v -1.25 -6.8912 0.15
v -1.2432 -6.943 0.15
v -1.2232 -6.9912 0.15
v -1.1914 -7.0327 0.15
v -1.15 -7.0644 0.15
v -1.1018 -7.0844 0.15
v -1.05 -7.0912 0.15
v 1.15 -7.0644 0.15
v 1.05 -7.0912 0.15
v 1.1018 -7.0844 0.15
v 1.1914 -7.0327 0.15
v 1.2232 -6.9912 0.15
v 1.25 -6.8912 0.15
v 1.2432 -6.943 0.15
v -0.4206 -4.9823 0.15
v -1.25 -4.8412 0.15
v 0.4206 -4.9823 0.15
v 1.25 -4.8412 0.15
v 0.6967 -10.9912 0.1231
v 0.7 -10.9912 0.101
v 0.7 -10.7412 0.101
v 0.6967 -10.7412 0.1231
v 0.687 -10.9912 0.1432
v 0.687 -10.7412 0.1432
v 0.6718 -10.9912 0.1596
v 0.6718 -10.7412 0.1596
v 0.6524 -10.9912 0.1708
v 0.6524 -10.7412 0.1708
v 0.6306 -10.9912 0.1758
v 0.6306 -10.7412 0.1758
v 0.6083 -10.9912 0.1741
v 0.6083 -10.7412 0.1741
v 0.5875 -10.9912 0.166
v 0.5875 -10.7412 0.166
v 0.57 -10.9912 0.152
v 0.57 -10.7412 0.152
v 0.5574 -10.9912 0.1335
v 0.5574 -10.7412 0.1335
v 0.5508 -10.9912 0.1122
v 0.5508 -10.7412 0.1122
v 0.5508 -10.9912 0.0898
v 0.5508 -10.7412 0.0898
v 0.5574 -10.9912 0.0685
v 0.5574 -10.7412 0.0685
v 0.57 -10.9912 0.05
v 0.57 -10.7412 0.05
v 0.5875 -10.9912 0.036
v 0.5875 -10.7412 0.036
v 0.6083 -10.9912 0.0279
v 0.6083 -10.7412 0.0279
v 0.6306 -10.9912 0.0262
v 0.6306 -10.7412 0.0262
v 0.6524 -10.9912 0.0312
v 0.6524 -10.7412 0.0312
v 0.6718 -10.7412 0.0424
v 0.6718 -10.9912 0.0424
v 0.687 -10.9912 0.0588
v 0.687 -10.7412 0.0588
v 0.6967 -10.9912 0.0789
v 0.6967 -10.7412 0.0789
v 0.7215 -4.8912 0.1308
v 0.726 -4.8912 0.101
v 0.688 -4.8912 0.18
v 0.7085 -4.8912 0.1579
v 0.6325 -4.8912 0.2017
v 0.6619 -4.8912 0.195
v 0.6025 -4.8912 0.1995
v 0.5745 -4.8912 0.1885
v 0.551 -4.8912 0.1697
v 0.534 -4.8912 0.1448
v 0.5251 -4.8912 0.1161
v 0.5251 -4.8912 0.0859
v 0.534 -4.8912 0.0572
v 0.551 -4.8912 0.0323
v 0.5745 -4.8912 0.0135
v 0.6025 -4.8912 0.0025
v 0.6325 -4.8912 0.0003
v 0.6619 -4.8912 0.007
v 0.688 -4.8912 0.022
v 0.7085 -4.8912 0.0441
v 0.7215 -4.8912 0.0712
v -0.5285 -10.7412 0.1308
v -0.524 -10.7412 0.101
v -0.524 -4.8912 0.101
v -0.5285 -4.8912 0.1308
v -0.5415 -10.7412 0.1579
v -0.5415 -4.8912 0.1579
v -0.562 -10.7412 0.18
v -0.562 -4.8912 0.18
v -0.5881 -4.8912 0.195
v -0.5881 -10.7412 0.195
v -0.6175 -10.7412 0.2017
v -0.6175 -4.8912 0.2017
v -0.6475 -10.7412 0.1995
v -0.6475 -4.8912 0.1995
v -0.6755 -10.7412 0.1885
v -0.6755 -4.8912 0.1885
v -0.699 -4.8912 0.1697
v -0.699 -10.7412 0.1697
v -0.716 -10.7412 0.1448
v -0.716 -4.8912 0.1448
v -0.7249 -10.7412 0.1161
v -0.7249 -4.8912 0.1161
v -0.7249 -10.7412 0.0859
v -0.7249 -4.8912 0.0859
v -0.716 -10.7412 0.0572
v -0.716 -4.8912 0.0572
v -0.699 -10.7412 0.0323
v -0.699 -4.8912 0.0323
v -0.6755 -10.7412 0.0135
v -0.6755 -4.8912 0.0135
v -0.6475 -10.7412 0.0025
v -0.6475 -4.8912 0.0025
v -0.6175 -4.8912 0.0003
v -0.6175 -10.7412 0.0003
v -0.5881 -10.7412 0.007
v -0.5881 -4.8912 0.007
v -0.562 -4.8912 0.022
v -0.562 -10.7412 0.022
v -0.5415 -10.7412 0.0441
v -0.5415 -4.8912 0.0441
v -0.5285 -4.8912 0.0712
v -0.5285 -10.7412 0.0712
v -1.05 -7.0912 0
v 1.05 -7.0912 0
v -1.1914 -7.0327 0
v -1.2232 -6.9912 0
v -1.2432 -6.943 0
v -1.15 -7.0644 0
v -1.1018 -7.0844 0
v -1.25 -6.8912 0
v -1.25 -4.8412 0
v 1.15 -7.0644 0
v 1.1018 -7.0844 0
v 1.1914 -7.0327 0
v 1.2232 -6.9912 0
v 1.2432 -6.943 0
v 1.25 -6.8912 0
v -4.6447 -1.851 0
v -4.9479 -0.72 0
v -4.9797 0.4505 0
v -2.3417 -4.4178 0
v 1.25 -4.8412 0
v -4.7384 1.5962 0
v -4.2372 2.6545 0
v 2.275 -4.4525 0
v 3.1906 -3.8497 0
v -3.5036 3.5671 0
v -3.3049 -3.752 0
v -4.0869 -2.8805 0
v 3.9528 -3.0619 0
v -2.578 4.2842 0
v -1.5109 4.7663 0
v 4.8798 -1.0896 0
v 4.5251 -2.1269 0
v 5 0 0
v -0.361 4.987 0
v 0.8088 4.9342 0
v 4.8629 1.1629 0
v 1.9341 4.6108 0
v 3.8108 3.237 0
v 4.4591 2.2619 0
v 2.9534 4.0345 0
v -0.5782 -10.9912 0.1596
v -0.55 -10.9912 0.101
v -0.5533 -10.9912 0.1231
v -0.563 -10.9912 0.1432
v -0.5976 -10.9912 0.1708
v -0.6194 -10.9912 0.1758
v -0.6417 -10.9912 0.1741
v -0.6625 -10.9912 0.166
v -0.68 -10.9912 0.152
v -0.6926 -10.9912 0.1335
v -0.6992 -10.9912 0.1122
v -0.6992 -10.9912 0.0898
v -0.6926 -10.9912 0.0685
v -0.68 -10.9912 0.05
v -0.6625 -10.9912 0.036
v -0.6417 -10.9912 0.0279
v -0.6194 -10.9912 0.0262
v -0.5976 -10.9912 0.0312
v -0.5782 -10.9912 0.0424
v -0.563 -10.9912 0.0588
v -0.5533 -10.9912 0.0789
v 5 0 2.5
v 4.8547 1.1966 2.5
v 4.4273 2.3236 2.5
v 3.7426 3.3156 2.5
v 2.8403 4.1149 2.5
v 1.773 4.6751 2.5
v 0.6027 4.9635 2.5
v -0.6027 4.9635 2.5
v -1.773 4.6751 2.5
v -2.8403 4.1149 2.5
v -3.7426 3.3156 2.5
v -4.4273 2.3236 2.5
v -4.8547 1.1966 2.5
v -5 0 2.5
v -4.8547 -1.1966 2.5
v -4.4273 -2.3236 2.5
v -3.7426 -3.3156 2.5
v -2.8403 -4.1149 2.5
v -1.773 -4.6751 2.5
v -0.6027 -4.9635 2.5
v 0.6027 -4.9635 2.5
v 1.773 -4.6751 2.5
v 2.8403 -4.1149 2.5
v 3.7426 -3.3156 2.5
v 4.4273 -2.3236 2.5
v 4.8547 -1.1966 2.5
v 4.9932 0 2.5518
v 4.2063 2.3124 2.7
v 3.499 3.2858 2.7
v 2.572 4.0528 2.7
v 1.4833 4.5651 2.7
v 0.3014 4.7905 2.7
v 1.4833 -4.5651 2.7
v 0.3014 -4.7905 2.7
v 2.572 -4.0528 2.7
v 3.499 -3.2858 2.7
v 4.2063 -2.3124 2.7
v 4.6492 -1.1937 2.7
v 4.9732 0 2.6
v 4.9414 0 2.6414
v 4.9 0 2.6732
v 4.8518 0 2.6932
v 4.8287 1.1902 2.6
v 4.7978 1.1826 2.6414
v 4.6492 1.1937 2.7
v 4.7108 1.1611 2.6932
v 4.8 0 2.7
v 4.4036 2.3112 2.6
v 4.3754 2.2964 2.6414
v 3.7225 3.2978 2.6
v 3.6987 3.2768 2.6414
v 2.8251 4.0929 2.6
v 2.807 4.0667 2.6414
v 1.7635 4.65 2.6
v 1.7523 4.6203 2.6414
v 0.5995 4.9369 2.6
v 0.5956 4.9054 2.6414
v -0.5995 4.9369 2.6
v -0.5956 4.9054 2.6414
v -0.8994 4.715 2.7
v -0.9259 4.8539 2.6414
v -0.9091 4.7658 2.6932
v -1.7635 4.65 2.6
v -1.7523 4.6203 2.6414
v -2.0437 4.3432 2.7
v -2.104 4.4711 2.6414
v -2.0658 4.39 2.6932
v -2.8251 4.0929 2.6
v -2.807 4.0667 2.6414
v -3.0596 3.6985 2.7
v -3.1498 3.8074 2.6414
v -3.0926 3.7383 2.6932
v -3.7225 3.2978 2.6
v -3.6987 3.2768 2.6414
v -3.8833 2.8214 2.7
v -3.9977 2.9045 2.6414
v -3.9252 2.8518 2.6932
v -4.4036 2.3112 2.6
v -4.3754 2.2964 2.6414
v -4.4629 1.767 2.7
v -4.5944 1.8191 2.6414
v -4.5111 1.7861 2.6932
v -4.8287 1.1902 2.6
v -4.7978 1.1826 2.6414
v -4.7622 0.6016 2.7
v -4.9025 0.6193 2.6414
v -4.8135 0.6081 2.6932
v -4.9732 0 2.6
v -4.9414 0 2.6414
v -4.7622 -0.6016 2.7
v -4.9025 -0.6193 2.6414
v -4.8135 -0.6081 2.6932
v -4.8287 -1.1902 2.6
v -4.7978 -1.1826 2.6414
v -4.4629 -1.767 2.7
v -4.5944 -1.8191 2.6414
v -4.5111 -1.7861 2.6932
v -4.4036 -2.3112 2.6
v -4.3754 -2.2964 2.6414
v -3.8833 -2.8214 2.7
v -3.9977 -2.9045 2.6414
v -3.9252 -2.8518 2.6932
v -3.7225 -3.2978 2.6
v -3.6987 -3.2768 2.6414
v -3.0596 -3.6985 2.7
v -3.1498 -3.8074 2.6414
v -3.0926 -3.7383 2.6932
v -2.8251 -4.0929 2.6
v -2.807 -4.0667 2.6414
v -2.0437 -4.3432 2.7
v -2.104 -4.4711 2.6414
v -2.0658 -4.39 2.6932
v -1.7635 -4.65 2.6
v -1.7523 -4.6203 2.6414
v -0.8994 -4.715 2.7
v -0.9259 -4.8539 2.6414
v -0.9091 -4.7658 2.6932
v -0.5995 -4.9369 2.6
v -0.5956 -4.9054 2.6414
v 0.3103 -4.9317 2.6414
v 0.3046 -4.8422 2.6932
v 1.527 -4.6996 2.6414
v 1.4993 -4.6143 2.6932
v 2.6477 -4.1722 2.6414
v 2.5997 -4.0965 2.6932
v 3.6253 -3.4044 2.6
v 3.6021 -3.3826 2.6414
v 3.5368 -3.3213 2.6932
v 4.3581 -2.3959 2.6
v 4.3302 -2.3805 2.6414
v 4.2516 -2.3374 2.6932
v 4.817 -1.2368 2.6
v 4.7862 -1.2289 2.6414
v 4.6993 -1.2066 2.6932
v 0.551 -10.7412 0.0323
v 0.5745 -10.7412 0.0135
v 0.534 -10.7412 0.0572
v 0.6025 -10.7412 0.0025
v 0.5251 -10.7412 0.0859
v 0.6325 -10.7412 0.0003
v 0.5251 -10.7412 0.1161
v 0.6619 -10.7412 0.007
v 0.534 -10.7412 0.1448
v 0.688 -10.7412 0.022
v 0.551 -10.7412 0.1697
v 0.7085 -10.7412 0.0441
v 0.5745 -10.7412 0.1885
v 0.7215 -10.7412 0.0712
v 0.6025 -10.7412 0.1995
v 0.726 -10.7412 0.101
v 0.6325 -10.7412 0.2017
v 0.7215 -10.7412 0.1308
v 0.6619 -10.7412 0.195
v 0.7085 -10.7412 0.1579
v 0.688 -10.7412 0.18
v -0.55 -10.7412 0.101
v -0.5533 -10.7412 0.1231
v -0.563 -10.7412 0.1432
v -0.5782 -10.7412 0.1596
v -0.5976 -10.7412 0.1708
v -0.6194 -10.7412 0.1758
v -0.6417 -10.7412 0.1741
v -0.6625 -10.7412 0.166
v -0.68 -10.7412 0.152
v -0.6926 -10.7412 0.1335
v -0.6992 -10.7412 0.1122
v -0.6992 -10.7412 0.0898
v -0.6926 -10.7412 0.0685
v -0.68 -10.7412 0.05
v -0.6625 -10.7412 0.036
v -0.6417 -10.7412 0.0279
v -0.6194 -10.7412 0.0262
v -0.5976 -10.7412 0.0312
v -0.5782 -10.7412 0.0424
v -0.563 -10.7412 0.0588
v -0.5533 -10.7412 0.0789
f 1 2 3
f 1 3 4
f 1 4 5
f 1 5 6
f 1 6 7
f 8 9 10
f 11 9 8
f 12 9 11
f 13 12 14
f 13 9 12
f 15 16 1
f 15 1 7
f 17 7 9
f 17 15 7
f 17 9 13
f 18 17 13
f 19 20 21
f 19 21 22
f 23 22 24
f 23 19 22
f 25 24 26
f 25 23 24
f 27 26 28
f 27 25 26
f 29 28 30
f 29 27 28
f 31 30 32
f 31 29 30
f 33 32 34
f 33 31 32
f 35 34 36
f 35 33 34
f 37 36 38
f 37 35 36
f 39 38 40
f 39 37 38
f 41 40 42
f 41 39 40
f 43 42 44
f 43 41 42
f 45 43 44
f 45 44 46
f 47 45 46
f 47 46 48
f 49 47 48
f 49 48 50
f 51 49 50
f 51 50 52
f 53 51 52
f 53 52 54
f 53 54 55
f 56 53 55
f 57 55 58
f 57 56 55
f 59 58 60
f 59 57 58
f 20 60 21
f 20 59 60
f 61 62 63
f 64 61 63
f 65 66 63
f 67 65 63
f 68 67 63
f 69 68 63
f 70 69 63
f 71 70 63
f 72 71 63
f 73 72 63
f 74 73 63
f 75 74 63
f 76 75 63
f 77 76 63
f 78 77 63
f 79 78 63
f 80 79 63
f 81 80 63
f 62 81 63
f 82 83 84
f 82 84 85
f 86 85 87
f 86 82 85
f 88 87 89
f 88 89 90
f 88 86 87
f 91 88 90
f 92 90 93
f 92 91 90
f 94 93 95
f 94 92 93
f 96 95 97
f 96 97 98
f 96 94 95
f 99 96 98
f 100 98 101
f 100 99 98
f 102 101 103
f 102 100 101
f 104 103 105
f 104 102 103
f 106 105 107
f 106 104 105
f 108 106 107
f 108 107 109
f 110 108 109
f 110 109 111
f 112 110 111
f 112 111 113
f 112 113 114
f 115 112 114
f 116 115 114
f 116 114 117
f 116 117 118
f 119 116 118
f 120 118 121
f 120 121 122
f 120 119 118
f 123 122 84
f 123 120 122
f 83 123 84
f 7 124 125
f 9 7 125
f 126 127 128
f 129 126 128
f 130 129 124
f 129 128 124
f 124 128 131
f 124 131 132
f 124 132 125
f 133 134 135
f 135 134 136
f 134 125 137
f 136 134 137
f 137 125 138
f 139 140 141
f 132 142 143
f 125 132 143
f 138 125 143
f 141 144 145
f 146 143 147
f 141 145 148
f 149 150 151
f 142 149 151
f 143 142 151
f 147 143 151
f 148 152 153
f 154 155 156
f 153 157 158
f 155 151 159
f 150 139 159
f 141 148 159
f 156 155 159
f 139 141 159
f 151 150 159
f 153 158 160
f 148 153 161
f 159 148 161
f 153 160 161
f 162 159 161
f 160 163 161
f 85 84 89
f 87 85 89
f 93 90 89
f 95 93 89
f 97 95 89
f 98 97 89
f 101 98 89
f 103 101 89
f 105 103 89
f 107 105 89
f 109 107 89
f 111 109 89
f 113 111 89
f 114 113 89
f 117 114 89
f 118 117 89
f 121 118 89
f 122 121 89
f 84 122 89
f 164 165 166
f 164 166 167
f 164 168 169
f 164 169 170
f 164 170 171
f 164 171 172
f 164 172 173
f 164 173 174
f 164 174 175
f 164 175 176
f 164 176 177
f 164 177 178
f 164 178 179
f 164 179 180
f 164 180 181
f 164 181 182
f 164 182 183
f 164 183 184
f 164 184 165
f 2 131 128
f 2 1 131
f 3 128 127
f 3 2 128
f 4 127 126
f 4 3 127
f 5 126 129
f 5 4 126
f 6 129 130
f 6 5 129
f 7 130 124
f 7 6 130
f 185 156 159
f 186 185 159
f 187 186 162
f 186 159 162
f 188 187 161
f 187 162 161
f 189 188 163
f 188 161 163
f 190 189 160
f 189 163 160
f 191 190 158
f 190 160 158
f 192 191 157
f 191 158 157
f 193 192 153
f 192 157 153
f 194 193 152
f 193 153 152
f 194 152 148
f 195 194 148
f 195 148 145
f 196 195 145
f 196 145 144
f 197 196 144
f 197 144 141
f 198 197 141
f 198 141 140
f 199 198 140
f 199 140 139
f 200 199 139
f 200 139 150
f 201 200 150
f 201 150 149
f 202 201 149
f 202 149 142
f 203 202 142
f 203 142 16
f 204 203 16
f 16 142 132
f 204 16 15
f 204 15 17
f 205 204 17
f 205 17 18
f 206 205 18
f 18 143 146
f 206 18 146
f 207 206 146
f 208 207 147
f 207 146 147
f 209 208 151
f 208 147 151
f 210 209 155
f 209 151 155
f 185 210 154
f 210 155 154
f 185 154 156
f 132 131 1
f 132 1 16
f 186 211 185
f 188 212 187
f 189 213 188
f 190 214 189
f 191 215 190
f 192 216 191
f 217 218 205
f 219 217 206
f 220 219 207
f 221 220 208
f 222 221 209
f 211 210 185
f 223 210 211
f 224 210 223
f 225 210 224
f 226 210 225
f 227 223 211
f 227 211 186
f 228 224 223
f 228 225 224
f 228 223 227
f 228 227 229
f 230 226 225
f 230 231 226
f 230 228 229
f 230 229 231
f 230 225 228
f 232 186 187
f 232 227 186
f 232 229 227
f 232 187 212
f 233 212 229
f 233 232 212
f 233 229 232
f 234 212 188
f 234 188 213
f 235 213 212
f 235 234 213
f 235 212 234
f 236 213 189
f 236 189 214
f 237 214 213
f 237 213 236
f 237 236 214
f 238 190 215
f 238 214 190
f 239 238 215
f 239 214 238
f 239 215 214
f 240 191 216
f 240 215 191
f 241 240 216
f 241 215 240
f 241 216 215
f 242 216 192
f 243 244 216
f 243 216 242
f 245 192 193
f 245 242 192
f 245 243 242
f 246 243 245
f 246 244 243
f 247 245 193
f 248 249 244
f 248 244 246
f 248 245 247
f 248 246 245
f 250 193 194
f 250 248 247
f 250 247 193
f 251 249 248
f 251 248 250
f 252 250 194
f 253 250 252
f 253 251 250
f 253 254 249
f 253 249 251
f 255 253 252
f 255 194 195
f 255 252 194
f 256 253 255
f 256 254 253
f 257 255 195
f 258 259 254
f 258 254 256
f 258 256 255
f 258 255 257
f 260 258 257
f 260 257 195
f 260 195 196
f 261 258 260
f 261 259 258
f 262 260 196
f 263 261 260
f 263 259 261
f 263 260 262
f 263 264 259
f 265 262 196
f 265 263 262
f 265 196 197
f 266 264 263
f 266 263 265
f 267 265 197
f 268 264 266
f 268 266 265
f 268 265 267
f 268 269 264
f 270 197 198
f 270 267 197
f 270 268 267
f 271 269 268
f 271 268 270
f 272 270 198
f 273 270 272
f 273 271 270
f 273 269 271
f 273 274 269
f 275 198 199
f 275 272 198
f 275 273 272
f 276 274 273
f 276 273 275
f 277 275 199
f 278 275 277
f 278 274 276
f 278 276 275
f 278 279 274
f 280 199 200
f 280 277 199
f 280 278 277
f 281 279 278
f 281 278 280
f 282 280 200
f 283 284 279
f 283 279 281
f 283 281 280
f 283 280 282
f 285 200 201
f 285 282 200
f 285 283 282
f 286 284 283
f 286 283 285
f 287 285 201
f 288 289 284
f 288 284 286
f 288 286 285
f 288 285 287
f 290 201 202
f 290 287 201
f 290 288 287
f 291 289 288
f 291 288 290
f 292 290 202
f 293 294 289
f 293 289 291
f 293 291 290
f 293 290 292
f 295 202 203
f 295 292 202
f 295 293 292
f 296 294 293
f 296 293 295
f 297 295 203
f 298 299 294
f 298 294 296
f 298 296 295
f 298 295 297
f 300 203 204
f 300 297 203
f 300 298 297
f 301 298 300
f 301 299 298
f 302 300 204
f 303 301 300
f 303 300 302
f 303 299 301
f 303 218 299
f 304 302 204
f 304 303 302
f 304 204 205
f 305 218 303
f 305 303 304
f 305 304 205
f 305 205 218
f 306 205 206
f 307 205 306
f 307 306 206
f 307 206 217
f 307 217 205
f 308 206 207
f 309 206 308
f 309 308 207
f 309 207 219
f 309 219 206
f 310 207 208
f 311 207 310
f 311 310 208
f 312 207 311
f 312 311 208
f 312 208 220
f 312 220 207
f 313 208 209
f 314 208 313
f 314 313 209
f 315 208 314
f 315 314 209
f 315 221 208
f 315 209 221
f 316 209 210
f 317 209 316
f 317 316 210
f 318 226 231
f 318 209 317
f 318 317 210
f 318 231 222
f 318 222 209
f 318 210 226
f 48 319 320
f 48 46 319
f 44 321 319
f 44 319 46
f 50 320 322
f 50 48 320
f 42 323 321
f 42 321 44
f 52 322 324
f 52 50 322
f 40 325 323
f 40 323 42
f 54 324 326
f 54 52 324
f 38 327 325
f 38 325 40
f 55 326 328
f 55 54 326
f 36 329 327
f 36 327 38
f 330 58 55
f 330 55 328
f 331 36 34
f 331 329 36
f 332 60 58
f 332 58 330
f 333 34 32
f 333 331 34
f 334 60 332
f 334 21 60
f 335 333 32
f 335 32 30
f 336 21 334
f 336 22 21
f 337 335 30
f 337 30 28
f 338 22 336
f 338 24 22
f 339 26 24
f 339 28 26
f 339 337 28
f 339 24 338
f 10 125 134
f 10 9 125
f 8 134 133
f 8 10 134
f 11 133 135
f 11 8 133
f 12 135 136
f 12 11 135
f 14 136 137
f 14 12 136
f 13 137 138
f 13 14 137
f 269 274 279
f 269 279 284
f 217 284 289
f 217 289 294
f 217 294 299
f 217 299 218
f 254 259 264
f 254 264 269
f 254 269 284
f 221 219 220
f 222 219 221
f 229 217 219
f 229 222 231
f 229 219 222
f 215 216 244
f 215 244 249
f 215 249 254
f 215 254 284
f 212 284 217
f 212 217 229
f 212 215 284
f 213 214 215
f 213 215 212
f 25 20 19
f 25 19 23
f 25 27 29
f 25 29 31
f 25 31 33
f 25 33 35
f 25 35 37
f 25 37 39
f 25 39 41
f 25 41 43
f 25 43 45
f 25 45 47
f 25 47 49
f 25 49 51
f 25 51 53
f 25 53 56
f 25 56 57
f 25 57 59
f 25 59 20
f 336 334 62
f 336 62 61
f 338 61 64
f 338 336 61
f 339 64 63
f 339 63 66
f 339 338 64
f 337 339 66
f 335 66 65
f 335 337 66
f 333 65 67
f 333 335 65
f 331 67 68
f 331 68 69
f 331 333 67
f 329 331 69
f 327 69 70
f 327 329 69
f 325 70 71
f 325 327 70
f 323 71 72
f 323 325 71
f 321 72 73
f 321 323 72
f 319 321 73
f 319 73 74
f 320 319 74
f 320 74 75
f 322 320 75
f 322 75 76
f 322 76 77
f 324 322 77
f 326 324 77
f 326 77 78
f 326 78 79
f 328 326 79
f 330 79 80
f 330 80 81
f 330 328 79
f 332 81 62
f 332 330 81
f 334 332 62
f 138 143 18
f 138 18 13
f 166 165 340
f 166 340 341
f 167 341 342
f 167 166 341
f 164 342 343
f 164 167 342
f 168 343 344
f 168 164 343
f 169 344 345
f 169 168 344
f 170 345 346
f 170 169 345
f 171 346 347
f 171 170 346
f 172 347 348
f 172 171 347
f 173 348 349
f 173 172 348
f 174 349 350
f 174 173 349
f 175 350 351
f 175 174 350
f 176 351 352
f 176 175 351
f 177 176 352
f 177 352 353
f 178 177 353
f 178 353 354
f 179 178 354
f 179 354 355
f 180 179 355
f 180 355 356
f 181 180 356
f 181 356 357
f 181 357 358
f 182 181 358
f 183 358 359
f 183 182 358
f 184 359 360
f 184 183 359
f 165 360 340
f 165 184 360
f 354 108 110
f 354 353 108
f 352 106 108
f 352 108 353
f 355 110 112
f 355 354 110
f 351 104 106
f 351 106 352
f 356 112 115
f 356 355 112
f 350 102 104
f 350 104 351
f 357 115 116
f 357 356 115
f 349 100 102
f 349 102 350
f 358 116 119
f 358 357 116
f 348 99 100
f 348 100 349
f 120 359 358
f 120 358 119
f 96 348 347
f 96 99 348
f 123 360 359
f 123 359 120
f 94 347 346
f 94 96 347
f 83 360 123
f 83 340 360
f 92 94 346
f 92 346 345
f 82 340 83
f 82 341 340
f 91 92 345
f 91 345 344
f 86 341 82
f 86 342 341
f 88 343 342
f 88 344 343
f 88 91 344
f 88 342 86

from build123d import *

# Parameters (mm, degrees)
SKETCH1_R                  = 5
BOSS_EXTRUDE1_DEPTH        = 2.7
BOSS_EXTRUDE2_DEPTH        = 0.15
SKETCH4_R                  = 0.101
BOSS_EXTRUDE3_DEPTH        = 3.9
BOSS_EXTRUDE3_DEPTH_BACK   = 2.2
BOSS_EXTRUDE3_2_DEPTH      = 3.9
BOSS_EXTRUDE3_2_DEPTH_BACK = 2.2
FILLET1_R                  = 0.2
FILLET2_R                  = 0.2
SKETCH5_OUTSIDE_W          = 15.81
SKETCH5_OUTSIDE_H          = 8.51
SKETCH5_OUTSIDE_R          = 0.075
CUT_EXTRUDE4_DEPTH         = 0.25


with BuildPart() as part:
    # Sketch1 → Boss-Extrude1 (new body)
    with BuildSketch(Plane.XY):
        Circle(SKETCH1_R)
    extrude(amount=BOSS_EXTRUDE1_DEPTH)

    # Sketch3 → Boss-Extrude2 (add)
    with BuildSketch(Plane(origin=(0, 0, 0), x_dir=(-1, 0, 0), z_dir=(0, 0, -1))):
        Polygon((1.25, -4.841229183), (1.25, -7.091229183), (-1.25, -7.091229183), (-1.25, -4.841229183), (-1.25, -4.179733262), (1.25, -4.179733262), align=None)
    extrude(amount=-BOSS_EXTRUDE2_DEPTH)

    # Fillet1
    fillet1_edges = [part.edges().sort_by_distance(p)[0] for p in [
        (1.25, -7.091229183, 0.075),
        (-1.25, -7.091229183, 0.075),
    ]]
    fillet(fillet1_edges, radius=FILLET1_R)

    # Fillet2
    fillet2_edges = [part.edges().sort_by_distance(p)[0] for p in [
        (-5, 0, 2.7),
    ]]
    fillet(fillet2_edges, radius=FILLET2_R)


with BuildPart() as body_2:
    # Sketch4 → Boss-Extrude3 (new body, two sides)
    with BuildSketch(Plane.XZ.offset(7.091229183)) as boss_extrude3_sk:
        with Locations((-0.625, 0.101)):
            Circle(SKETCH4_R)
    extrude(amount=BOSS_EXTRUDE3_DEPTH)
    extrude(boss_extrude3_sk.sketch, amount=-BOSS_EXTRUDE3_DEPTH_BACK)


with BuildPart() as body_3:
    # Sketch4 → Boss-Extrude3 2 (new body, two sides)
    with BuildSketch(Plane.XZ.offset(7.091229183)) as boss_extrude3_2_sk:
        with Locations((0.625, 0.101)):
            Circle(SKETCH4_R)
    extrude(amount=BOSS_EXTRUDE3_2_DEPTH)
    extrude(boss_extrude3_2_sk.sketch, amount=-BOSS_EXTRUDE3_2_DEPTH_BACK)


with BuildPart() as cut_extrude4_tool:
    # Sketch5 outside → Cut-Extrude4 (new body)
    with BuildSketch(Plane.XZ.offset(10.991229183)):
        with Locations((0, 1.35)):
            Rectangle(SKETCH5_OUTSIDE_W, SKETCH5_OUTSIDE_H)
        with Locations((-0.625, 0.101)):
            Circle(SKETCH5_OUTSIDE_R, mode=Mode.SUBTRACT)
        with Locations((0.625, 0.101)):
            Circle(SKETCH5_OUTSIDE_R, mode=Mode.SUBTRACT)
    extrude(amount=-CUT_EXTRUDE4_DEPTH)


with BuildPart() as body_2_1:
    add(body_2.part)

    # Cut-Extrude4: cut by cut_extrude4_tool
    add(cut_extrude4_tool.part, mode=Mode.SUBTRACT)


with BuildPart() as body_3_1:
    add(body_3.part)

    # Cut-Extrude4: cut by cut_extrude4_tool
    add(cut_extrude4_tool.part, mode=Mode.SUBTRACT)


solid = Compound([part.part, body_2_1.part, body_3_1.part])
